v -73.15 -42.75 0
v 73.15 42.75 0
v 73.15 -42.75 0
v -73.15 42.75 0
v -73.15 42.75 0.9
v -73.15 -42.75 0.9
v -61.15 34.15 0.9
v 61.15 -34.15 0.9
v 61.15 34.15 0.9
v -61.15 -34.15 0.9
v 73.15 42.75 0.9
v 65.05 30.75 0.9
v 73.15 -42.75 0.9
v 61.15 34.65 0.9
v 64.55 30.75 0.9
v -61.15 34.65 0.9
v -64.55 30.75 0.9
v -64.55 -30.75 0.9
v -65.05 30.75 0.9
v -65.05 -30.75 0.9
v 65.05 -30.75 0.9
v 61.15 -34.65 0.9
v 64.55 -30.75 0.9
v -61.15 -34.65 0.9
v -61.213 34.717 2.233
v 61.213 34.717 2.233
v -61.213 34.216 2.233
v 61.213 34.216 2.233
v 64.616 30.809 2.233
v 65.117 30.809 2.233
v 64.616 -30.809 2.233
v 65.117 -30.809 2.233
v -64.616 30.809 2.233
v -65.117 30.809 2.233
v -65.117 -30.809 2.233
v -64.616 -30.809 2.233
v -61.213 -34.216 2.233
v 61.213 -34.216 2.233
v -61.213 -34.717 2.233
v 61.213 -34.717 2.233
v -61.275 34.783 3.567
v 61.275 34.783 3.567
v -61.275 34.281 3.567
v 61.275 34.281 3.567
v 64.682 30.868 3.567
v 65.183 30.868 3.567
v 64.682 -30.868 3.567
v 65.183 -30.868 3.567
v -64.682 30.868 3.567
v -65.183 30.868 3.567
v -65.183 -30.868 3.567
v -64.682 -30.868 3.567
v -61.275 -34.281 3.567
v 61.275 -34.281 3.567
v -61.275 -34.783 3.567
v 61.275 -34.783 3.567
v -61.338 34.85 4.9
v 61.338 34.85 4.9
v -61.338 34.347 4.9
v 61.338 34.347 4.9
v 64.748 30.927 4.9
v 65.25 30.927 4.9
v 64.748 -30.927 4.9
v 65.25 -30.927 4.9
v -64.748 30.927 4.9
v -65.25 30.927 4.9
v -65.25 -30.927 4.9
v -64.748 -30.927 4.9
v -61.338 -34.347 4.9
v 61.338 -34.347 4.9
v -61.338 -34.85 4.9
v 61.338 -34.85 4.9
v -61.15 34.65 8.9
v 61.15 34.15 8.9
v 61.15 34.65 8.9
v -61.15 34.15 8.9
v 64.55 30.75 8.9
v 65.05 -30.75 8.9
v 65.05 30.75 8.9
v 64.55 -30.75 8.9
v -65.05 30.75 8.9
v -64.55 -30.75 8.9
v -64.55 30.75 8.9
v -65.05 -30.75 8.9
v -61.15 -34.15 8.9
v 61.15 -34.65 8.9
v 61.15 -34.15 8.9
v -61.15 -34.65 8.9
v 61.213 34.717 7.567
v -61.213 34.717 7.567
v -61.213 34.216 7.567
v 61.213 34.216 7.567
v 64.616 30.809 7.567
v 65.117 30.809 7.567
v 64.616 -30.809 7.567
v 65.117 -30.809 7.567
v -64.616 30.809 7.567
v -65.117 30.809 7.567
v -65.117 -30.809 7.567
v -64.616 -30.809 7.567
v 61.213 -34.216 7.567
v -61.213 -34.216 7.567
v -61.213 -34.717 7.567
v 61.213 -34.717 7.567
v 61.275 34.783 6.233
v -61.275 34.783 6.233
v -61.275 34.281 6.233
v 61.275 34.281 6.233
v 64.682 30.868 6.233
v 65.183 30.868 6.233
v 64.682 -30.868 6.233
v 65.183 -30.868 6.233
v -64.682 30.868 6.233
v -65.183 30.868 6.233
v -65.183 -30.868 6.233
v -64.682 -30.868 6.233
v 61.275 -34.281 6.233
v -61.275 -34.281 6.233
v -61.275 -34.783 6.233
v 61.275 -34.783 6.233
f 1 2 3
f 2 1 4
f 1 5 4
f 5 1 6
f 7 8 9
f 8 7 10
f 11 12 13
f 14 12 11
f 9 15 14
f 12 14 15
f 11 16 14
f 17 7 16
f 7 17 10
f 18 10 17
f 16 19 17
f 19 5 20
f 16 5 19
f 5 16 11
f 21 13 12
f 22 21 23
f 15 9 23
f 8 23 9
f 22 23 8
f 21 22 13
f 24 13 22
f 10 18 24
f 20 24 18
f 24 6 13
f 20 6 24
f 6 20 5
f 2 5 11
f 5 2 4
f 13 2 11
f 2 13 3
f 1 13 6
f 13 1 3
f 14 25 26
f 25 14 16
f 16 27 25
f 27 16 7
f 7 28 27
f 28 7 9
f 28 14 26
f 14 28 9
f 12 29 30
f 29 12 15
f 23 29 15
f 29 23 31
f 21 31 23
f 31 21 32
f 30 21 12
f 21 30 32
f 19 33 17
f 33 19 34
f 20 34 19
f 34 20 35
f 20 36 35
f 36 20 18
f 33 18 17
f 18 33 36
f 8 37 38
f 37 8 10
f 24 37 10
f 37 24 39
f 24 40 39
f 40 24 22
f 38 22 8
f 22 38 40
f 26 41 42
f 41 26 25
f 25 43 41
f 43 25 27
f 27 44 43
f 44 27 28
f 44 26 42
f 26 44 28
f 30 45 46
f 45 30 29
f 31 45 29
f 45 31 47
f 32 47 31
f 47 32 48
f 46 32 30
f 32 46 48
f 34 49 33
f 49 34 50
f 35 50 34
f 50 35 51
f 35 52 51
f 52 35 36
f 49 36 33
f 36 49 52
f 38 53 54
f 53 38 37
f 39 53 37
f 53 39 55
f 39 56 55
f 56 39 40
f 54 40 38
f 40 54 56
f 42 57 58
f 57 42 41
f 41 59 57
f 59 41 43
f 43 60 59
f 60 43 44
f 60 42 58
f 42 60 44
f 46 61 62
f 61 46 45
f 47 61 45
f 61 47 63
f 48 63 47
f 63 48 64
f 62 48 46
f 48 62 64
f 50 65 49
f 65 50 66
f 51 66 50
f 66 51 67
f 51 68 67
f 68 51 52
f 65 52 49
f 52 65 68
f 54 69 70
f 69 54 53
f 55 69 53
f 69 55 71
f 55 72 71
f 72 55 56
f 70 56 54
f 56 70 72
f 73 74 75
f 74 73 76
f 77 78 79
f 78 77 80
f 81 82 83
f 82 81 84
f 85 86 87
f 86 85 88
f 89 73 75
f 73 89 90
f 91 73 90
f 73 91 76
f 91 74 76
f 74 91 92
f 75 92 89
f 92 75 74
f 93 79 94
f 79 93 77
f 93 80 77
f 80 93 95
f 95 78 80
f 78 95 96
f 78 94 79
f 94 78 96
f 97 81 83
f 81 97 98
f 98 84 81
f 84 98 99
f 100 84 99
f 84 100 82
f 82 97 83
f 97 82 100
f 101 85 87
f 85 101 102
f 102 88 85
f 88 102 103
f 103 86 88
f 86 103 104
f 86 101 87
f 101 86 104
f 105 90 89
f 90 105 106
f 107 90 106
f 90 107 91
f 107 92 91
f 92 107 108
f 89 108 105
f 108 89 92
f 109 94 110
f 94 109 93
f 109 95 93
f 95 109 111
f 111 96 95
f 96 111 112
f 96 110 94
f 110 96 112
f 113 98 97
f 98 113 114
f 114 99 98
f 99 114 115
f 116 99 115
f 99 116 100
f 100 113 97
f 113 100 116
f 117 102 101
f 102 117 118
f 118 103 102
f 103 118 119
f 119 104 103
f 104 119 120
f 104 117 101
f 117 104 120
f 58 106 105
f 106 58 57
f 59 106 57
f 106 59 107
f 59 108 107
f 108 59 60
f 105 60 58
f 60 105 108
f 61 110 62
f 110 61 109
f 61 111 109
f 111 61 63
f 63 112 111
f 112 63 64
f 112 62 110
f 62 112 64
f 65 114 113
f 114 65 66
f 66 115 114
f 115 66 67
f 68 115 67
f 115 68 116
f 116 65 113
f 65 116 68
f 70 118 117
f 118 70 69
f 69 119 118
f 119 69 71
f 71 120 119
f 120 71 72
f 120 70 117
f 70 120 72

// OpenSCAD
// Print settings that this model is designed for
layer_height    = 0.25;
extrusion_width = 0.45;

material_xy = layer_height * 4;
material_z  = extrusion_width * 2;

overhang = 8.0;


back_cover();
// TASK: Add side cover.


module back_cover() {
    size = [130.3, 69.5];

    cover(size);

    // TASK: Add holes.
}

module cover(size) {
    base();

    translate([0, 0, material_z])
    half_holders();

    translate([0, 0, material_z + overhang])
    mirror([0, 0, 1])
    half_holders();

    module base() {
        linear_extrude(material_z)
        square(size = size + 2 * [overhang, overhang], center = true);
    }

    module half_holders() {
        interference = [0.2, 0.2];

        size_inner = size - interference;
        size_outer = size + interference;

        scale = [
            size_outer[0] / size_inner[0],
            size_outer[1] / size_inner[1],
        ];

        linear_extrude(height = overhang / 2, scale = scale)
        difference() {
            square(size = size_inner, center = true);
            square(
                size = size_inner - [material_xy, material_xy],
                center = true
            );

            corners = [
                [-size[0], -size[1]],
                [-size[0],  size[1]],
                [ size[0], -size[1]],
                [ size[0],  size[1]],
            ];
            for (corner = corners) {
                translate(corner / 2)
                square([overhang, overhang], center = true);
            }
        }
    }
}
